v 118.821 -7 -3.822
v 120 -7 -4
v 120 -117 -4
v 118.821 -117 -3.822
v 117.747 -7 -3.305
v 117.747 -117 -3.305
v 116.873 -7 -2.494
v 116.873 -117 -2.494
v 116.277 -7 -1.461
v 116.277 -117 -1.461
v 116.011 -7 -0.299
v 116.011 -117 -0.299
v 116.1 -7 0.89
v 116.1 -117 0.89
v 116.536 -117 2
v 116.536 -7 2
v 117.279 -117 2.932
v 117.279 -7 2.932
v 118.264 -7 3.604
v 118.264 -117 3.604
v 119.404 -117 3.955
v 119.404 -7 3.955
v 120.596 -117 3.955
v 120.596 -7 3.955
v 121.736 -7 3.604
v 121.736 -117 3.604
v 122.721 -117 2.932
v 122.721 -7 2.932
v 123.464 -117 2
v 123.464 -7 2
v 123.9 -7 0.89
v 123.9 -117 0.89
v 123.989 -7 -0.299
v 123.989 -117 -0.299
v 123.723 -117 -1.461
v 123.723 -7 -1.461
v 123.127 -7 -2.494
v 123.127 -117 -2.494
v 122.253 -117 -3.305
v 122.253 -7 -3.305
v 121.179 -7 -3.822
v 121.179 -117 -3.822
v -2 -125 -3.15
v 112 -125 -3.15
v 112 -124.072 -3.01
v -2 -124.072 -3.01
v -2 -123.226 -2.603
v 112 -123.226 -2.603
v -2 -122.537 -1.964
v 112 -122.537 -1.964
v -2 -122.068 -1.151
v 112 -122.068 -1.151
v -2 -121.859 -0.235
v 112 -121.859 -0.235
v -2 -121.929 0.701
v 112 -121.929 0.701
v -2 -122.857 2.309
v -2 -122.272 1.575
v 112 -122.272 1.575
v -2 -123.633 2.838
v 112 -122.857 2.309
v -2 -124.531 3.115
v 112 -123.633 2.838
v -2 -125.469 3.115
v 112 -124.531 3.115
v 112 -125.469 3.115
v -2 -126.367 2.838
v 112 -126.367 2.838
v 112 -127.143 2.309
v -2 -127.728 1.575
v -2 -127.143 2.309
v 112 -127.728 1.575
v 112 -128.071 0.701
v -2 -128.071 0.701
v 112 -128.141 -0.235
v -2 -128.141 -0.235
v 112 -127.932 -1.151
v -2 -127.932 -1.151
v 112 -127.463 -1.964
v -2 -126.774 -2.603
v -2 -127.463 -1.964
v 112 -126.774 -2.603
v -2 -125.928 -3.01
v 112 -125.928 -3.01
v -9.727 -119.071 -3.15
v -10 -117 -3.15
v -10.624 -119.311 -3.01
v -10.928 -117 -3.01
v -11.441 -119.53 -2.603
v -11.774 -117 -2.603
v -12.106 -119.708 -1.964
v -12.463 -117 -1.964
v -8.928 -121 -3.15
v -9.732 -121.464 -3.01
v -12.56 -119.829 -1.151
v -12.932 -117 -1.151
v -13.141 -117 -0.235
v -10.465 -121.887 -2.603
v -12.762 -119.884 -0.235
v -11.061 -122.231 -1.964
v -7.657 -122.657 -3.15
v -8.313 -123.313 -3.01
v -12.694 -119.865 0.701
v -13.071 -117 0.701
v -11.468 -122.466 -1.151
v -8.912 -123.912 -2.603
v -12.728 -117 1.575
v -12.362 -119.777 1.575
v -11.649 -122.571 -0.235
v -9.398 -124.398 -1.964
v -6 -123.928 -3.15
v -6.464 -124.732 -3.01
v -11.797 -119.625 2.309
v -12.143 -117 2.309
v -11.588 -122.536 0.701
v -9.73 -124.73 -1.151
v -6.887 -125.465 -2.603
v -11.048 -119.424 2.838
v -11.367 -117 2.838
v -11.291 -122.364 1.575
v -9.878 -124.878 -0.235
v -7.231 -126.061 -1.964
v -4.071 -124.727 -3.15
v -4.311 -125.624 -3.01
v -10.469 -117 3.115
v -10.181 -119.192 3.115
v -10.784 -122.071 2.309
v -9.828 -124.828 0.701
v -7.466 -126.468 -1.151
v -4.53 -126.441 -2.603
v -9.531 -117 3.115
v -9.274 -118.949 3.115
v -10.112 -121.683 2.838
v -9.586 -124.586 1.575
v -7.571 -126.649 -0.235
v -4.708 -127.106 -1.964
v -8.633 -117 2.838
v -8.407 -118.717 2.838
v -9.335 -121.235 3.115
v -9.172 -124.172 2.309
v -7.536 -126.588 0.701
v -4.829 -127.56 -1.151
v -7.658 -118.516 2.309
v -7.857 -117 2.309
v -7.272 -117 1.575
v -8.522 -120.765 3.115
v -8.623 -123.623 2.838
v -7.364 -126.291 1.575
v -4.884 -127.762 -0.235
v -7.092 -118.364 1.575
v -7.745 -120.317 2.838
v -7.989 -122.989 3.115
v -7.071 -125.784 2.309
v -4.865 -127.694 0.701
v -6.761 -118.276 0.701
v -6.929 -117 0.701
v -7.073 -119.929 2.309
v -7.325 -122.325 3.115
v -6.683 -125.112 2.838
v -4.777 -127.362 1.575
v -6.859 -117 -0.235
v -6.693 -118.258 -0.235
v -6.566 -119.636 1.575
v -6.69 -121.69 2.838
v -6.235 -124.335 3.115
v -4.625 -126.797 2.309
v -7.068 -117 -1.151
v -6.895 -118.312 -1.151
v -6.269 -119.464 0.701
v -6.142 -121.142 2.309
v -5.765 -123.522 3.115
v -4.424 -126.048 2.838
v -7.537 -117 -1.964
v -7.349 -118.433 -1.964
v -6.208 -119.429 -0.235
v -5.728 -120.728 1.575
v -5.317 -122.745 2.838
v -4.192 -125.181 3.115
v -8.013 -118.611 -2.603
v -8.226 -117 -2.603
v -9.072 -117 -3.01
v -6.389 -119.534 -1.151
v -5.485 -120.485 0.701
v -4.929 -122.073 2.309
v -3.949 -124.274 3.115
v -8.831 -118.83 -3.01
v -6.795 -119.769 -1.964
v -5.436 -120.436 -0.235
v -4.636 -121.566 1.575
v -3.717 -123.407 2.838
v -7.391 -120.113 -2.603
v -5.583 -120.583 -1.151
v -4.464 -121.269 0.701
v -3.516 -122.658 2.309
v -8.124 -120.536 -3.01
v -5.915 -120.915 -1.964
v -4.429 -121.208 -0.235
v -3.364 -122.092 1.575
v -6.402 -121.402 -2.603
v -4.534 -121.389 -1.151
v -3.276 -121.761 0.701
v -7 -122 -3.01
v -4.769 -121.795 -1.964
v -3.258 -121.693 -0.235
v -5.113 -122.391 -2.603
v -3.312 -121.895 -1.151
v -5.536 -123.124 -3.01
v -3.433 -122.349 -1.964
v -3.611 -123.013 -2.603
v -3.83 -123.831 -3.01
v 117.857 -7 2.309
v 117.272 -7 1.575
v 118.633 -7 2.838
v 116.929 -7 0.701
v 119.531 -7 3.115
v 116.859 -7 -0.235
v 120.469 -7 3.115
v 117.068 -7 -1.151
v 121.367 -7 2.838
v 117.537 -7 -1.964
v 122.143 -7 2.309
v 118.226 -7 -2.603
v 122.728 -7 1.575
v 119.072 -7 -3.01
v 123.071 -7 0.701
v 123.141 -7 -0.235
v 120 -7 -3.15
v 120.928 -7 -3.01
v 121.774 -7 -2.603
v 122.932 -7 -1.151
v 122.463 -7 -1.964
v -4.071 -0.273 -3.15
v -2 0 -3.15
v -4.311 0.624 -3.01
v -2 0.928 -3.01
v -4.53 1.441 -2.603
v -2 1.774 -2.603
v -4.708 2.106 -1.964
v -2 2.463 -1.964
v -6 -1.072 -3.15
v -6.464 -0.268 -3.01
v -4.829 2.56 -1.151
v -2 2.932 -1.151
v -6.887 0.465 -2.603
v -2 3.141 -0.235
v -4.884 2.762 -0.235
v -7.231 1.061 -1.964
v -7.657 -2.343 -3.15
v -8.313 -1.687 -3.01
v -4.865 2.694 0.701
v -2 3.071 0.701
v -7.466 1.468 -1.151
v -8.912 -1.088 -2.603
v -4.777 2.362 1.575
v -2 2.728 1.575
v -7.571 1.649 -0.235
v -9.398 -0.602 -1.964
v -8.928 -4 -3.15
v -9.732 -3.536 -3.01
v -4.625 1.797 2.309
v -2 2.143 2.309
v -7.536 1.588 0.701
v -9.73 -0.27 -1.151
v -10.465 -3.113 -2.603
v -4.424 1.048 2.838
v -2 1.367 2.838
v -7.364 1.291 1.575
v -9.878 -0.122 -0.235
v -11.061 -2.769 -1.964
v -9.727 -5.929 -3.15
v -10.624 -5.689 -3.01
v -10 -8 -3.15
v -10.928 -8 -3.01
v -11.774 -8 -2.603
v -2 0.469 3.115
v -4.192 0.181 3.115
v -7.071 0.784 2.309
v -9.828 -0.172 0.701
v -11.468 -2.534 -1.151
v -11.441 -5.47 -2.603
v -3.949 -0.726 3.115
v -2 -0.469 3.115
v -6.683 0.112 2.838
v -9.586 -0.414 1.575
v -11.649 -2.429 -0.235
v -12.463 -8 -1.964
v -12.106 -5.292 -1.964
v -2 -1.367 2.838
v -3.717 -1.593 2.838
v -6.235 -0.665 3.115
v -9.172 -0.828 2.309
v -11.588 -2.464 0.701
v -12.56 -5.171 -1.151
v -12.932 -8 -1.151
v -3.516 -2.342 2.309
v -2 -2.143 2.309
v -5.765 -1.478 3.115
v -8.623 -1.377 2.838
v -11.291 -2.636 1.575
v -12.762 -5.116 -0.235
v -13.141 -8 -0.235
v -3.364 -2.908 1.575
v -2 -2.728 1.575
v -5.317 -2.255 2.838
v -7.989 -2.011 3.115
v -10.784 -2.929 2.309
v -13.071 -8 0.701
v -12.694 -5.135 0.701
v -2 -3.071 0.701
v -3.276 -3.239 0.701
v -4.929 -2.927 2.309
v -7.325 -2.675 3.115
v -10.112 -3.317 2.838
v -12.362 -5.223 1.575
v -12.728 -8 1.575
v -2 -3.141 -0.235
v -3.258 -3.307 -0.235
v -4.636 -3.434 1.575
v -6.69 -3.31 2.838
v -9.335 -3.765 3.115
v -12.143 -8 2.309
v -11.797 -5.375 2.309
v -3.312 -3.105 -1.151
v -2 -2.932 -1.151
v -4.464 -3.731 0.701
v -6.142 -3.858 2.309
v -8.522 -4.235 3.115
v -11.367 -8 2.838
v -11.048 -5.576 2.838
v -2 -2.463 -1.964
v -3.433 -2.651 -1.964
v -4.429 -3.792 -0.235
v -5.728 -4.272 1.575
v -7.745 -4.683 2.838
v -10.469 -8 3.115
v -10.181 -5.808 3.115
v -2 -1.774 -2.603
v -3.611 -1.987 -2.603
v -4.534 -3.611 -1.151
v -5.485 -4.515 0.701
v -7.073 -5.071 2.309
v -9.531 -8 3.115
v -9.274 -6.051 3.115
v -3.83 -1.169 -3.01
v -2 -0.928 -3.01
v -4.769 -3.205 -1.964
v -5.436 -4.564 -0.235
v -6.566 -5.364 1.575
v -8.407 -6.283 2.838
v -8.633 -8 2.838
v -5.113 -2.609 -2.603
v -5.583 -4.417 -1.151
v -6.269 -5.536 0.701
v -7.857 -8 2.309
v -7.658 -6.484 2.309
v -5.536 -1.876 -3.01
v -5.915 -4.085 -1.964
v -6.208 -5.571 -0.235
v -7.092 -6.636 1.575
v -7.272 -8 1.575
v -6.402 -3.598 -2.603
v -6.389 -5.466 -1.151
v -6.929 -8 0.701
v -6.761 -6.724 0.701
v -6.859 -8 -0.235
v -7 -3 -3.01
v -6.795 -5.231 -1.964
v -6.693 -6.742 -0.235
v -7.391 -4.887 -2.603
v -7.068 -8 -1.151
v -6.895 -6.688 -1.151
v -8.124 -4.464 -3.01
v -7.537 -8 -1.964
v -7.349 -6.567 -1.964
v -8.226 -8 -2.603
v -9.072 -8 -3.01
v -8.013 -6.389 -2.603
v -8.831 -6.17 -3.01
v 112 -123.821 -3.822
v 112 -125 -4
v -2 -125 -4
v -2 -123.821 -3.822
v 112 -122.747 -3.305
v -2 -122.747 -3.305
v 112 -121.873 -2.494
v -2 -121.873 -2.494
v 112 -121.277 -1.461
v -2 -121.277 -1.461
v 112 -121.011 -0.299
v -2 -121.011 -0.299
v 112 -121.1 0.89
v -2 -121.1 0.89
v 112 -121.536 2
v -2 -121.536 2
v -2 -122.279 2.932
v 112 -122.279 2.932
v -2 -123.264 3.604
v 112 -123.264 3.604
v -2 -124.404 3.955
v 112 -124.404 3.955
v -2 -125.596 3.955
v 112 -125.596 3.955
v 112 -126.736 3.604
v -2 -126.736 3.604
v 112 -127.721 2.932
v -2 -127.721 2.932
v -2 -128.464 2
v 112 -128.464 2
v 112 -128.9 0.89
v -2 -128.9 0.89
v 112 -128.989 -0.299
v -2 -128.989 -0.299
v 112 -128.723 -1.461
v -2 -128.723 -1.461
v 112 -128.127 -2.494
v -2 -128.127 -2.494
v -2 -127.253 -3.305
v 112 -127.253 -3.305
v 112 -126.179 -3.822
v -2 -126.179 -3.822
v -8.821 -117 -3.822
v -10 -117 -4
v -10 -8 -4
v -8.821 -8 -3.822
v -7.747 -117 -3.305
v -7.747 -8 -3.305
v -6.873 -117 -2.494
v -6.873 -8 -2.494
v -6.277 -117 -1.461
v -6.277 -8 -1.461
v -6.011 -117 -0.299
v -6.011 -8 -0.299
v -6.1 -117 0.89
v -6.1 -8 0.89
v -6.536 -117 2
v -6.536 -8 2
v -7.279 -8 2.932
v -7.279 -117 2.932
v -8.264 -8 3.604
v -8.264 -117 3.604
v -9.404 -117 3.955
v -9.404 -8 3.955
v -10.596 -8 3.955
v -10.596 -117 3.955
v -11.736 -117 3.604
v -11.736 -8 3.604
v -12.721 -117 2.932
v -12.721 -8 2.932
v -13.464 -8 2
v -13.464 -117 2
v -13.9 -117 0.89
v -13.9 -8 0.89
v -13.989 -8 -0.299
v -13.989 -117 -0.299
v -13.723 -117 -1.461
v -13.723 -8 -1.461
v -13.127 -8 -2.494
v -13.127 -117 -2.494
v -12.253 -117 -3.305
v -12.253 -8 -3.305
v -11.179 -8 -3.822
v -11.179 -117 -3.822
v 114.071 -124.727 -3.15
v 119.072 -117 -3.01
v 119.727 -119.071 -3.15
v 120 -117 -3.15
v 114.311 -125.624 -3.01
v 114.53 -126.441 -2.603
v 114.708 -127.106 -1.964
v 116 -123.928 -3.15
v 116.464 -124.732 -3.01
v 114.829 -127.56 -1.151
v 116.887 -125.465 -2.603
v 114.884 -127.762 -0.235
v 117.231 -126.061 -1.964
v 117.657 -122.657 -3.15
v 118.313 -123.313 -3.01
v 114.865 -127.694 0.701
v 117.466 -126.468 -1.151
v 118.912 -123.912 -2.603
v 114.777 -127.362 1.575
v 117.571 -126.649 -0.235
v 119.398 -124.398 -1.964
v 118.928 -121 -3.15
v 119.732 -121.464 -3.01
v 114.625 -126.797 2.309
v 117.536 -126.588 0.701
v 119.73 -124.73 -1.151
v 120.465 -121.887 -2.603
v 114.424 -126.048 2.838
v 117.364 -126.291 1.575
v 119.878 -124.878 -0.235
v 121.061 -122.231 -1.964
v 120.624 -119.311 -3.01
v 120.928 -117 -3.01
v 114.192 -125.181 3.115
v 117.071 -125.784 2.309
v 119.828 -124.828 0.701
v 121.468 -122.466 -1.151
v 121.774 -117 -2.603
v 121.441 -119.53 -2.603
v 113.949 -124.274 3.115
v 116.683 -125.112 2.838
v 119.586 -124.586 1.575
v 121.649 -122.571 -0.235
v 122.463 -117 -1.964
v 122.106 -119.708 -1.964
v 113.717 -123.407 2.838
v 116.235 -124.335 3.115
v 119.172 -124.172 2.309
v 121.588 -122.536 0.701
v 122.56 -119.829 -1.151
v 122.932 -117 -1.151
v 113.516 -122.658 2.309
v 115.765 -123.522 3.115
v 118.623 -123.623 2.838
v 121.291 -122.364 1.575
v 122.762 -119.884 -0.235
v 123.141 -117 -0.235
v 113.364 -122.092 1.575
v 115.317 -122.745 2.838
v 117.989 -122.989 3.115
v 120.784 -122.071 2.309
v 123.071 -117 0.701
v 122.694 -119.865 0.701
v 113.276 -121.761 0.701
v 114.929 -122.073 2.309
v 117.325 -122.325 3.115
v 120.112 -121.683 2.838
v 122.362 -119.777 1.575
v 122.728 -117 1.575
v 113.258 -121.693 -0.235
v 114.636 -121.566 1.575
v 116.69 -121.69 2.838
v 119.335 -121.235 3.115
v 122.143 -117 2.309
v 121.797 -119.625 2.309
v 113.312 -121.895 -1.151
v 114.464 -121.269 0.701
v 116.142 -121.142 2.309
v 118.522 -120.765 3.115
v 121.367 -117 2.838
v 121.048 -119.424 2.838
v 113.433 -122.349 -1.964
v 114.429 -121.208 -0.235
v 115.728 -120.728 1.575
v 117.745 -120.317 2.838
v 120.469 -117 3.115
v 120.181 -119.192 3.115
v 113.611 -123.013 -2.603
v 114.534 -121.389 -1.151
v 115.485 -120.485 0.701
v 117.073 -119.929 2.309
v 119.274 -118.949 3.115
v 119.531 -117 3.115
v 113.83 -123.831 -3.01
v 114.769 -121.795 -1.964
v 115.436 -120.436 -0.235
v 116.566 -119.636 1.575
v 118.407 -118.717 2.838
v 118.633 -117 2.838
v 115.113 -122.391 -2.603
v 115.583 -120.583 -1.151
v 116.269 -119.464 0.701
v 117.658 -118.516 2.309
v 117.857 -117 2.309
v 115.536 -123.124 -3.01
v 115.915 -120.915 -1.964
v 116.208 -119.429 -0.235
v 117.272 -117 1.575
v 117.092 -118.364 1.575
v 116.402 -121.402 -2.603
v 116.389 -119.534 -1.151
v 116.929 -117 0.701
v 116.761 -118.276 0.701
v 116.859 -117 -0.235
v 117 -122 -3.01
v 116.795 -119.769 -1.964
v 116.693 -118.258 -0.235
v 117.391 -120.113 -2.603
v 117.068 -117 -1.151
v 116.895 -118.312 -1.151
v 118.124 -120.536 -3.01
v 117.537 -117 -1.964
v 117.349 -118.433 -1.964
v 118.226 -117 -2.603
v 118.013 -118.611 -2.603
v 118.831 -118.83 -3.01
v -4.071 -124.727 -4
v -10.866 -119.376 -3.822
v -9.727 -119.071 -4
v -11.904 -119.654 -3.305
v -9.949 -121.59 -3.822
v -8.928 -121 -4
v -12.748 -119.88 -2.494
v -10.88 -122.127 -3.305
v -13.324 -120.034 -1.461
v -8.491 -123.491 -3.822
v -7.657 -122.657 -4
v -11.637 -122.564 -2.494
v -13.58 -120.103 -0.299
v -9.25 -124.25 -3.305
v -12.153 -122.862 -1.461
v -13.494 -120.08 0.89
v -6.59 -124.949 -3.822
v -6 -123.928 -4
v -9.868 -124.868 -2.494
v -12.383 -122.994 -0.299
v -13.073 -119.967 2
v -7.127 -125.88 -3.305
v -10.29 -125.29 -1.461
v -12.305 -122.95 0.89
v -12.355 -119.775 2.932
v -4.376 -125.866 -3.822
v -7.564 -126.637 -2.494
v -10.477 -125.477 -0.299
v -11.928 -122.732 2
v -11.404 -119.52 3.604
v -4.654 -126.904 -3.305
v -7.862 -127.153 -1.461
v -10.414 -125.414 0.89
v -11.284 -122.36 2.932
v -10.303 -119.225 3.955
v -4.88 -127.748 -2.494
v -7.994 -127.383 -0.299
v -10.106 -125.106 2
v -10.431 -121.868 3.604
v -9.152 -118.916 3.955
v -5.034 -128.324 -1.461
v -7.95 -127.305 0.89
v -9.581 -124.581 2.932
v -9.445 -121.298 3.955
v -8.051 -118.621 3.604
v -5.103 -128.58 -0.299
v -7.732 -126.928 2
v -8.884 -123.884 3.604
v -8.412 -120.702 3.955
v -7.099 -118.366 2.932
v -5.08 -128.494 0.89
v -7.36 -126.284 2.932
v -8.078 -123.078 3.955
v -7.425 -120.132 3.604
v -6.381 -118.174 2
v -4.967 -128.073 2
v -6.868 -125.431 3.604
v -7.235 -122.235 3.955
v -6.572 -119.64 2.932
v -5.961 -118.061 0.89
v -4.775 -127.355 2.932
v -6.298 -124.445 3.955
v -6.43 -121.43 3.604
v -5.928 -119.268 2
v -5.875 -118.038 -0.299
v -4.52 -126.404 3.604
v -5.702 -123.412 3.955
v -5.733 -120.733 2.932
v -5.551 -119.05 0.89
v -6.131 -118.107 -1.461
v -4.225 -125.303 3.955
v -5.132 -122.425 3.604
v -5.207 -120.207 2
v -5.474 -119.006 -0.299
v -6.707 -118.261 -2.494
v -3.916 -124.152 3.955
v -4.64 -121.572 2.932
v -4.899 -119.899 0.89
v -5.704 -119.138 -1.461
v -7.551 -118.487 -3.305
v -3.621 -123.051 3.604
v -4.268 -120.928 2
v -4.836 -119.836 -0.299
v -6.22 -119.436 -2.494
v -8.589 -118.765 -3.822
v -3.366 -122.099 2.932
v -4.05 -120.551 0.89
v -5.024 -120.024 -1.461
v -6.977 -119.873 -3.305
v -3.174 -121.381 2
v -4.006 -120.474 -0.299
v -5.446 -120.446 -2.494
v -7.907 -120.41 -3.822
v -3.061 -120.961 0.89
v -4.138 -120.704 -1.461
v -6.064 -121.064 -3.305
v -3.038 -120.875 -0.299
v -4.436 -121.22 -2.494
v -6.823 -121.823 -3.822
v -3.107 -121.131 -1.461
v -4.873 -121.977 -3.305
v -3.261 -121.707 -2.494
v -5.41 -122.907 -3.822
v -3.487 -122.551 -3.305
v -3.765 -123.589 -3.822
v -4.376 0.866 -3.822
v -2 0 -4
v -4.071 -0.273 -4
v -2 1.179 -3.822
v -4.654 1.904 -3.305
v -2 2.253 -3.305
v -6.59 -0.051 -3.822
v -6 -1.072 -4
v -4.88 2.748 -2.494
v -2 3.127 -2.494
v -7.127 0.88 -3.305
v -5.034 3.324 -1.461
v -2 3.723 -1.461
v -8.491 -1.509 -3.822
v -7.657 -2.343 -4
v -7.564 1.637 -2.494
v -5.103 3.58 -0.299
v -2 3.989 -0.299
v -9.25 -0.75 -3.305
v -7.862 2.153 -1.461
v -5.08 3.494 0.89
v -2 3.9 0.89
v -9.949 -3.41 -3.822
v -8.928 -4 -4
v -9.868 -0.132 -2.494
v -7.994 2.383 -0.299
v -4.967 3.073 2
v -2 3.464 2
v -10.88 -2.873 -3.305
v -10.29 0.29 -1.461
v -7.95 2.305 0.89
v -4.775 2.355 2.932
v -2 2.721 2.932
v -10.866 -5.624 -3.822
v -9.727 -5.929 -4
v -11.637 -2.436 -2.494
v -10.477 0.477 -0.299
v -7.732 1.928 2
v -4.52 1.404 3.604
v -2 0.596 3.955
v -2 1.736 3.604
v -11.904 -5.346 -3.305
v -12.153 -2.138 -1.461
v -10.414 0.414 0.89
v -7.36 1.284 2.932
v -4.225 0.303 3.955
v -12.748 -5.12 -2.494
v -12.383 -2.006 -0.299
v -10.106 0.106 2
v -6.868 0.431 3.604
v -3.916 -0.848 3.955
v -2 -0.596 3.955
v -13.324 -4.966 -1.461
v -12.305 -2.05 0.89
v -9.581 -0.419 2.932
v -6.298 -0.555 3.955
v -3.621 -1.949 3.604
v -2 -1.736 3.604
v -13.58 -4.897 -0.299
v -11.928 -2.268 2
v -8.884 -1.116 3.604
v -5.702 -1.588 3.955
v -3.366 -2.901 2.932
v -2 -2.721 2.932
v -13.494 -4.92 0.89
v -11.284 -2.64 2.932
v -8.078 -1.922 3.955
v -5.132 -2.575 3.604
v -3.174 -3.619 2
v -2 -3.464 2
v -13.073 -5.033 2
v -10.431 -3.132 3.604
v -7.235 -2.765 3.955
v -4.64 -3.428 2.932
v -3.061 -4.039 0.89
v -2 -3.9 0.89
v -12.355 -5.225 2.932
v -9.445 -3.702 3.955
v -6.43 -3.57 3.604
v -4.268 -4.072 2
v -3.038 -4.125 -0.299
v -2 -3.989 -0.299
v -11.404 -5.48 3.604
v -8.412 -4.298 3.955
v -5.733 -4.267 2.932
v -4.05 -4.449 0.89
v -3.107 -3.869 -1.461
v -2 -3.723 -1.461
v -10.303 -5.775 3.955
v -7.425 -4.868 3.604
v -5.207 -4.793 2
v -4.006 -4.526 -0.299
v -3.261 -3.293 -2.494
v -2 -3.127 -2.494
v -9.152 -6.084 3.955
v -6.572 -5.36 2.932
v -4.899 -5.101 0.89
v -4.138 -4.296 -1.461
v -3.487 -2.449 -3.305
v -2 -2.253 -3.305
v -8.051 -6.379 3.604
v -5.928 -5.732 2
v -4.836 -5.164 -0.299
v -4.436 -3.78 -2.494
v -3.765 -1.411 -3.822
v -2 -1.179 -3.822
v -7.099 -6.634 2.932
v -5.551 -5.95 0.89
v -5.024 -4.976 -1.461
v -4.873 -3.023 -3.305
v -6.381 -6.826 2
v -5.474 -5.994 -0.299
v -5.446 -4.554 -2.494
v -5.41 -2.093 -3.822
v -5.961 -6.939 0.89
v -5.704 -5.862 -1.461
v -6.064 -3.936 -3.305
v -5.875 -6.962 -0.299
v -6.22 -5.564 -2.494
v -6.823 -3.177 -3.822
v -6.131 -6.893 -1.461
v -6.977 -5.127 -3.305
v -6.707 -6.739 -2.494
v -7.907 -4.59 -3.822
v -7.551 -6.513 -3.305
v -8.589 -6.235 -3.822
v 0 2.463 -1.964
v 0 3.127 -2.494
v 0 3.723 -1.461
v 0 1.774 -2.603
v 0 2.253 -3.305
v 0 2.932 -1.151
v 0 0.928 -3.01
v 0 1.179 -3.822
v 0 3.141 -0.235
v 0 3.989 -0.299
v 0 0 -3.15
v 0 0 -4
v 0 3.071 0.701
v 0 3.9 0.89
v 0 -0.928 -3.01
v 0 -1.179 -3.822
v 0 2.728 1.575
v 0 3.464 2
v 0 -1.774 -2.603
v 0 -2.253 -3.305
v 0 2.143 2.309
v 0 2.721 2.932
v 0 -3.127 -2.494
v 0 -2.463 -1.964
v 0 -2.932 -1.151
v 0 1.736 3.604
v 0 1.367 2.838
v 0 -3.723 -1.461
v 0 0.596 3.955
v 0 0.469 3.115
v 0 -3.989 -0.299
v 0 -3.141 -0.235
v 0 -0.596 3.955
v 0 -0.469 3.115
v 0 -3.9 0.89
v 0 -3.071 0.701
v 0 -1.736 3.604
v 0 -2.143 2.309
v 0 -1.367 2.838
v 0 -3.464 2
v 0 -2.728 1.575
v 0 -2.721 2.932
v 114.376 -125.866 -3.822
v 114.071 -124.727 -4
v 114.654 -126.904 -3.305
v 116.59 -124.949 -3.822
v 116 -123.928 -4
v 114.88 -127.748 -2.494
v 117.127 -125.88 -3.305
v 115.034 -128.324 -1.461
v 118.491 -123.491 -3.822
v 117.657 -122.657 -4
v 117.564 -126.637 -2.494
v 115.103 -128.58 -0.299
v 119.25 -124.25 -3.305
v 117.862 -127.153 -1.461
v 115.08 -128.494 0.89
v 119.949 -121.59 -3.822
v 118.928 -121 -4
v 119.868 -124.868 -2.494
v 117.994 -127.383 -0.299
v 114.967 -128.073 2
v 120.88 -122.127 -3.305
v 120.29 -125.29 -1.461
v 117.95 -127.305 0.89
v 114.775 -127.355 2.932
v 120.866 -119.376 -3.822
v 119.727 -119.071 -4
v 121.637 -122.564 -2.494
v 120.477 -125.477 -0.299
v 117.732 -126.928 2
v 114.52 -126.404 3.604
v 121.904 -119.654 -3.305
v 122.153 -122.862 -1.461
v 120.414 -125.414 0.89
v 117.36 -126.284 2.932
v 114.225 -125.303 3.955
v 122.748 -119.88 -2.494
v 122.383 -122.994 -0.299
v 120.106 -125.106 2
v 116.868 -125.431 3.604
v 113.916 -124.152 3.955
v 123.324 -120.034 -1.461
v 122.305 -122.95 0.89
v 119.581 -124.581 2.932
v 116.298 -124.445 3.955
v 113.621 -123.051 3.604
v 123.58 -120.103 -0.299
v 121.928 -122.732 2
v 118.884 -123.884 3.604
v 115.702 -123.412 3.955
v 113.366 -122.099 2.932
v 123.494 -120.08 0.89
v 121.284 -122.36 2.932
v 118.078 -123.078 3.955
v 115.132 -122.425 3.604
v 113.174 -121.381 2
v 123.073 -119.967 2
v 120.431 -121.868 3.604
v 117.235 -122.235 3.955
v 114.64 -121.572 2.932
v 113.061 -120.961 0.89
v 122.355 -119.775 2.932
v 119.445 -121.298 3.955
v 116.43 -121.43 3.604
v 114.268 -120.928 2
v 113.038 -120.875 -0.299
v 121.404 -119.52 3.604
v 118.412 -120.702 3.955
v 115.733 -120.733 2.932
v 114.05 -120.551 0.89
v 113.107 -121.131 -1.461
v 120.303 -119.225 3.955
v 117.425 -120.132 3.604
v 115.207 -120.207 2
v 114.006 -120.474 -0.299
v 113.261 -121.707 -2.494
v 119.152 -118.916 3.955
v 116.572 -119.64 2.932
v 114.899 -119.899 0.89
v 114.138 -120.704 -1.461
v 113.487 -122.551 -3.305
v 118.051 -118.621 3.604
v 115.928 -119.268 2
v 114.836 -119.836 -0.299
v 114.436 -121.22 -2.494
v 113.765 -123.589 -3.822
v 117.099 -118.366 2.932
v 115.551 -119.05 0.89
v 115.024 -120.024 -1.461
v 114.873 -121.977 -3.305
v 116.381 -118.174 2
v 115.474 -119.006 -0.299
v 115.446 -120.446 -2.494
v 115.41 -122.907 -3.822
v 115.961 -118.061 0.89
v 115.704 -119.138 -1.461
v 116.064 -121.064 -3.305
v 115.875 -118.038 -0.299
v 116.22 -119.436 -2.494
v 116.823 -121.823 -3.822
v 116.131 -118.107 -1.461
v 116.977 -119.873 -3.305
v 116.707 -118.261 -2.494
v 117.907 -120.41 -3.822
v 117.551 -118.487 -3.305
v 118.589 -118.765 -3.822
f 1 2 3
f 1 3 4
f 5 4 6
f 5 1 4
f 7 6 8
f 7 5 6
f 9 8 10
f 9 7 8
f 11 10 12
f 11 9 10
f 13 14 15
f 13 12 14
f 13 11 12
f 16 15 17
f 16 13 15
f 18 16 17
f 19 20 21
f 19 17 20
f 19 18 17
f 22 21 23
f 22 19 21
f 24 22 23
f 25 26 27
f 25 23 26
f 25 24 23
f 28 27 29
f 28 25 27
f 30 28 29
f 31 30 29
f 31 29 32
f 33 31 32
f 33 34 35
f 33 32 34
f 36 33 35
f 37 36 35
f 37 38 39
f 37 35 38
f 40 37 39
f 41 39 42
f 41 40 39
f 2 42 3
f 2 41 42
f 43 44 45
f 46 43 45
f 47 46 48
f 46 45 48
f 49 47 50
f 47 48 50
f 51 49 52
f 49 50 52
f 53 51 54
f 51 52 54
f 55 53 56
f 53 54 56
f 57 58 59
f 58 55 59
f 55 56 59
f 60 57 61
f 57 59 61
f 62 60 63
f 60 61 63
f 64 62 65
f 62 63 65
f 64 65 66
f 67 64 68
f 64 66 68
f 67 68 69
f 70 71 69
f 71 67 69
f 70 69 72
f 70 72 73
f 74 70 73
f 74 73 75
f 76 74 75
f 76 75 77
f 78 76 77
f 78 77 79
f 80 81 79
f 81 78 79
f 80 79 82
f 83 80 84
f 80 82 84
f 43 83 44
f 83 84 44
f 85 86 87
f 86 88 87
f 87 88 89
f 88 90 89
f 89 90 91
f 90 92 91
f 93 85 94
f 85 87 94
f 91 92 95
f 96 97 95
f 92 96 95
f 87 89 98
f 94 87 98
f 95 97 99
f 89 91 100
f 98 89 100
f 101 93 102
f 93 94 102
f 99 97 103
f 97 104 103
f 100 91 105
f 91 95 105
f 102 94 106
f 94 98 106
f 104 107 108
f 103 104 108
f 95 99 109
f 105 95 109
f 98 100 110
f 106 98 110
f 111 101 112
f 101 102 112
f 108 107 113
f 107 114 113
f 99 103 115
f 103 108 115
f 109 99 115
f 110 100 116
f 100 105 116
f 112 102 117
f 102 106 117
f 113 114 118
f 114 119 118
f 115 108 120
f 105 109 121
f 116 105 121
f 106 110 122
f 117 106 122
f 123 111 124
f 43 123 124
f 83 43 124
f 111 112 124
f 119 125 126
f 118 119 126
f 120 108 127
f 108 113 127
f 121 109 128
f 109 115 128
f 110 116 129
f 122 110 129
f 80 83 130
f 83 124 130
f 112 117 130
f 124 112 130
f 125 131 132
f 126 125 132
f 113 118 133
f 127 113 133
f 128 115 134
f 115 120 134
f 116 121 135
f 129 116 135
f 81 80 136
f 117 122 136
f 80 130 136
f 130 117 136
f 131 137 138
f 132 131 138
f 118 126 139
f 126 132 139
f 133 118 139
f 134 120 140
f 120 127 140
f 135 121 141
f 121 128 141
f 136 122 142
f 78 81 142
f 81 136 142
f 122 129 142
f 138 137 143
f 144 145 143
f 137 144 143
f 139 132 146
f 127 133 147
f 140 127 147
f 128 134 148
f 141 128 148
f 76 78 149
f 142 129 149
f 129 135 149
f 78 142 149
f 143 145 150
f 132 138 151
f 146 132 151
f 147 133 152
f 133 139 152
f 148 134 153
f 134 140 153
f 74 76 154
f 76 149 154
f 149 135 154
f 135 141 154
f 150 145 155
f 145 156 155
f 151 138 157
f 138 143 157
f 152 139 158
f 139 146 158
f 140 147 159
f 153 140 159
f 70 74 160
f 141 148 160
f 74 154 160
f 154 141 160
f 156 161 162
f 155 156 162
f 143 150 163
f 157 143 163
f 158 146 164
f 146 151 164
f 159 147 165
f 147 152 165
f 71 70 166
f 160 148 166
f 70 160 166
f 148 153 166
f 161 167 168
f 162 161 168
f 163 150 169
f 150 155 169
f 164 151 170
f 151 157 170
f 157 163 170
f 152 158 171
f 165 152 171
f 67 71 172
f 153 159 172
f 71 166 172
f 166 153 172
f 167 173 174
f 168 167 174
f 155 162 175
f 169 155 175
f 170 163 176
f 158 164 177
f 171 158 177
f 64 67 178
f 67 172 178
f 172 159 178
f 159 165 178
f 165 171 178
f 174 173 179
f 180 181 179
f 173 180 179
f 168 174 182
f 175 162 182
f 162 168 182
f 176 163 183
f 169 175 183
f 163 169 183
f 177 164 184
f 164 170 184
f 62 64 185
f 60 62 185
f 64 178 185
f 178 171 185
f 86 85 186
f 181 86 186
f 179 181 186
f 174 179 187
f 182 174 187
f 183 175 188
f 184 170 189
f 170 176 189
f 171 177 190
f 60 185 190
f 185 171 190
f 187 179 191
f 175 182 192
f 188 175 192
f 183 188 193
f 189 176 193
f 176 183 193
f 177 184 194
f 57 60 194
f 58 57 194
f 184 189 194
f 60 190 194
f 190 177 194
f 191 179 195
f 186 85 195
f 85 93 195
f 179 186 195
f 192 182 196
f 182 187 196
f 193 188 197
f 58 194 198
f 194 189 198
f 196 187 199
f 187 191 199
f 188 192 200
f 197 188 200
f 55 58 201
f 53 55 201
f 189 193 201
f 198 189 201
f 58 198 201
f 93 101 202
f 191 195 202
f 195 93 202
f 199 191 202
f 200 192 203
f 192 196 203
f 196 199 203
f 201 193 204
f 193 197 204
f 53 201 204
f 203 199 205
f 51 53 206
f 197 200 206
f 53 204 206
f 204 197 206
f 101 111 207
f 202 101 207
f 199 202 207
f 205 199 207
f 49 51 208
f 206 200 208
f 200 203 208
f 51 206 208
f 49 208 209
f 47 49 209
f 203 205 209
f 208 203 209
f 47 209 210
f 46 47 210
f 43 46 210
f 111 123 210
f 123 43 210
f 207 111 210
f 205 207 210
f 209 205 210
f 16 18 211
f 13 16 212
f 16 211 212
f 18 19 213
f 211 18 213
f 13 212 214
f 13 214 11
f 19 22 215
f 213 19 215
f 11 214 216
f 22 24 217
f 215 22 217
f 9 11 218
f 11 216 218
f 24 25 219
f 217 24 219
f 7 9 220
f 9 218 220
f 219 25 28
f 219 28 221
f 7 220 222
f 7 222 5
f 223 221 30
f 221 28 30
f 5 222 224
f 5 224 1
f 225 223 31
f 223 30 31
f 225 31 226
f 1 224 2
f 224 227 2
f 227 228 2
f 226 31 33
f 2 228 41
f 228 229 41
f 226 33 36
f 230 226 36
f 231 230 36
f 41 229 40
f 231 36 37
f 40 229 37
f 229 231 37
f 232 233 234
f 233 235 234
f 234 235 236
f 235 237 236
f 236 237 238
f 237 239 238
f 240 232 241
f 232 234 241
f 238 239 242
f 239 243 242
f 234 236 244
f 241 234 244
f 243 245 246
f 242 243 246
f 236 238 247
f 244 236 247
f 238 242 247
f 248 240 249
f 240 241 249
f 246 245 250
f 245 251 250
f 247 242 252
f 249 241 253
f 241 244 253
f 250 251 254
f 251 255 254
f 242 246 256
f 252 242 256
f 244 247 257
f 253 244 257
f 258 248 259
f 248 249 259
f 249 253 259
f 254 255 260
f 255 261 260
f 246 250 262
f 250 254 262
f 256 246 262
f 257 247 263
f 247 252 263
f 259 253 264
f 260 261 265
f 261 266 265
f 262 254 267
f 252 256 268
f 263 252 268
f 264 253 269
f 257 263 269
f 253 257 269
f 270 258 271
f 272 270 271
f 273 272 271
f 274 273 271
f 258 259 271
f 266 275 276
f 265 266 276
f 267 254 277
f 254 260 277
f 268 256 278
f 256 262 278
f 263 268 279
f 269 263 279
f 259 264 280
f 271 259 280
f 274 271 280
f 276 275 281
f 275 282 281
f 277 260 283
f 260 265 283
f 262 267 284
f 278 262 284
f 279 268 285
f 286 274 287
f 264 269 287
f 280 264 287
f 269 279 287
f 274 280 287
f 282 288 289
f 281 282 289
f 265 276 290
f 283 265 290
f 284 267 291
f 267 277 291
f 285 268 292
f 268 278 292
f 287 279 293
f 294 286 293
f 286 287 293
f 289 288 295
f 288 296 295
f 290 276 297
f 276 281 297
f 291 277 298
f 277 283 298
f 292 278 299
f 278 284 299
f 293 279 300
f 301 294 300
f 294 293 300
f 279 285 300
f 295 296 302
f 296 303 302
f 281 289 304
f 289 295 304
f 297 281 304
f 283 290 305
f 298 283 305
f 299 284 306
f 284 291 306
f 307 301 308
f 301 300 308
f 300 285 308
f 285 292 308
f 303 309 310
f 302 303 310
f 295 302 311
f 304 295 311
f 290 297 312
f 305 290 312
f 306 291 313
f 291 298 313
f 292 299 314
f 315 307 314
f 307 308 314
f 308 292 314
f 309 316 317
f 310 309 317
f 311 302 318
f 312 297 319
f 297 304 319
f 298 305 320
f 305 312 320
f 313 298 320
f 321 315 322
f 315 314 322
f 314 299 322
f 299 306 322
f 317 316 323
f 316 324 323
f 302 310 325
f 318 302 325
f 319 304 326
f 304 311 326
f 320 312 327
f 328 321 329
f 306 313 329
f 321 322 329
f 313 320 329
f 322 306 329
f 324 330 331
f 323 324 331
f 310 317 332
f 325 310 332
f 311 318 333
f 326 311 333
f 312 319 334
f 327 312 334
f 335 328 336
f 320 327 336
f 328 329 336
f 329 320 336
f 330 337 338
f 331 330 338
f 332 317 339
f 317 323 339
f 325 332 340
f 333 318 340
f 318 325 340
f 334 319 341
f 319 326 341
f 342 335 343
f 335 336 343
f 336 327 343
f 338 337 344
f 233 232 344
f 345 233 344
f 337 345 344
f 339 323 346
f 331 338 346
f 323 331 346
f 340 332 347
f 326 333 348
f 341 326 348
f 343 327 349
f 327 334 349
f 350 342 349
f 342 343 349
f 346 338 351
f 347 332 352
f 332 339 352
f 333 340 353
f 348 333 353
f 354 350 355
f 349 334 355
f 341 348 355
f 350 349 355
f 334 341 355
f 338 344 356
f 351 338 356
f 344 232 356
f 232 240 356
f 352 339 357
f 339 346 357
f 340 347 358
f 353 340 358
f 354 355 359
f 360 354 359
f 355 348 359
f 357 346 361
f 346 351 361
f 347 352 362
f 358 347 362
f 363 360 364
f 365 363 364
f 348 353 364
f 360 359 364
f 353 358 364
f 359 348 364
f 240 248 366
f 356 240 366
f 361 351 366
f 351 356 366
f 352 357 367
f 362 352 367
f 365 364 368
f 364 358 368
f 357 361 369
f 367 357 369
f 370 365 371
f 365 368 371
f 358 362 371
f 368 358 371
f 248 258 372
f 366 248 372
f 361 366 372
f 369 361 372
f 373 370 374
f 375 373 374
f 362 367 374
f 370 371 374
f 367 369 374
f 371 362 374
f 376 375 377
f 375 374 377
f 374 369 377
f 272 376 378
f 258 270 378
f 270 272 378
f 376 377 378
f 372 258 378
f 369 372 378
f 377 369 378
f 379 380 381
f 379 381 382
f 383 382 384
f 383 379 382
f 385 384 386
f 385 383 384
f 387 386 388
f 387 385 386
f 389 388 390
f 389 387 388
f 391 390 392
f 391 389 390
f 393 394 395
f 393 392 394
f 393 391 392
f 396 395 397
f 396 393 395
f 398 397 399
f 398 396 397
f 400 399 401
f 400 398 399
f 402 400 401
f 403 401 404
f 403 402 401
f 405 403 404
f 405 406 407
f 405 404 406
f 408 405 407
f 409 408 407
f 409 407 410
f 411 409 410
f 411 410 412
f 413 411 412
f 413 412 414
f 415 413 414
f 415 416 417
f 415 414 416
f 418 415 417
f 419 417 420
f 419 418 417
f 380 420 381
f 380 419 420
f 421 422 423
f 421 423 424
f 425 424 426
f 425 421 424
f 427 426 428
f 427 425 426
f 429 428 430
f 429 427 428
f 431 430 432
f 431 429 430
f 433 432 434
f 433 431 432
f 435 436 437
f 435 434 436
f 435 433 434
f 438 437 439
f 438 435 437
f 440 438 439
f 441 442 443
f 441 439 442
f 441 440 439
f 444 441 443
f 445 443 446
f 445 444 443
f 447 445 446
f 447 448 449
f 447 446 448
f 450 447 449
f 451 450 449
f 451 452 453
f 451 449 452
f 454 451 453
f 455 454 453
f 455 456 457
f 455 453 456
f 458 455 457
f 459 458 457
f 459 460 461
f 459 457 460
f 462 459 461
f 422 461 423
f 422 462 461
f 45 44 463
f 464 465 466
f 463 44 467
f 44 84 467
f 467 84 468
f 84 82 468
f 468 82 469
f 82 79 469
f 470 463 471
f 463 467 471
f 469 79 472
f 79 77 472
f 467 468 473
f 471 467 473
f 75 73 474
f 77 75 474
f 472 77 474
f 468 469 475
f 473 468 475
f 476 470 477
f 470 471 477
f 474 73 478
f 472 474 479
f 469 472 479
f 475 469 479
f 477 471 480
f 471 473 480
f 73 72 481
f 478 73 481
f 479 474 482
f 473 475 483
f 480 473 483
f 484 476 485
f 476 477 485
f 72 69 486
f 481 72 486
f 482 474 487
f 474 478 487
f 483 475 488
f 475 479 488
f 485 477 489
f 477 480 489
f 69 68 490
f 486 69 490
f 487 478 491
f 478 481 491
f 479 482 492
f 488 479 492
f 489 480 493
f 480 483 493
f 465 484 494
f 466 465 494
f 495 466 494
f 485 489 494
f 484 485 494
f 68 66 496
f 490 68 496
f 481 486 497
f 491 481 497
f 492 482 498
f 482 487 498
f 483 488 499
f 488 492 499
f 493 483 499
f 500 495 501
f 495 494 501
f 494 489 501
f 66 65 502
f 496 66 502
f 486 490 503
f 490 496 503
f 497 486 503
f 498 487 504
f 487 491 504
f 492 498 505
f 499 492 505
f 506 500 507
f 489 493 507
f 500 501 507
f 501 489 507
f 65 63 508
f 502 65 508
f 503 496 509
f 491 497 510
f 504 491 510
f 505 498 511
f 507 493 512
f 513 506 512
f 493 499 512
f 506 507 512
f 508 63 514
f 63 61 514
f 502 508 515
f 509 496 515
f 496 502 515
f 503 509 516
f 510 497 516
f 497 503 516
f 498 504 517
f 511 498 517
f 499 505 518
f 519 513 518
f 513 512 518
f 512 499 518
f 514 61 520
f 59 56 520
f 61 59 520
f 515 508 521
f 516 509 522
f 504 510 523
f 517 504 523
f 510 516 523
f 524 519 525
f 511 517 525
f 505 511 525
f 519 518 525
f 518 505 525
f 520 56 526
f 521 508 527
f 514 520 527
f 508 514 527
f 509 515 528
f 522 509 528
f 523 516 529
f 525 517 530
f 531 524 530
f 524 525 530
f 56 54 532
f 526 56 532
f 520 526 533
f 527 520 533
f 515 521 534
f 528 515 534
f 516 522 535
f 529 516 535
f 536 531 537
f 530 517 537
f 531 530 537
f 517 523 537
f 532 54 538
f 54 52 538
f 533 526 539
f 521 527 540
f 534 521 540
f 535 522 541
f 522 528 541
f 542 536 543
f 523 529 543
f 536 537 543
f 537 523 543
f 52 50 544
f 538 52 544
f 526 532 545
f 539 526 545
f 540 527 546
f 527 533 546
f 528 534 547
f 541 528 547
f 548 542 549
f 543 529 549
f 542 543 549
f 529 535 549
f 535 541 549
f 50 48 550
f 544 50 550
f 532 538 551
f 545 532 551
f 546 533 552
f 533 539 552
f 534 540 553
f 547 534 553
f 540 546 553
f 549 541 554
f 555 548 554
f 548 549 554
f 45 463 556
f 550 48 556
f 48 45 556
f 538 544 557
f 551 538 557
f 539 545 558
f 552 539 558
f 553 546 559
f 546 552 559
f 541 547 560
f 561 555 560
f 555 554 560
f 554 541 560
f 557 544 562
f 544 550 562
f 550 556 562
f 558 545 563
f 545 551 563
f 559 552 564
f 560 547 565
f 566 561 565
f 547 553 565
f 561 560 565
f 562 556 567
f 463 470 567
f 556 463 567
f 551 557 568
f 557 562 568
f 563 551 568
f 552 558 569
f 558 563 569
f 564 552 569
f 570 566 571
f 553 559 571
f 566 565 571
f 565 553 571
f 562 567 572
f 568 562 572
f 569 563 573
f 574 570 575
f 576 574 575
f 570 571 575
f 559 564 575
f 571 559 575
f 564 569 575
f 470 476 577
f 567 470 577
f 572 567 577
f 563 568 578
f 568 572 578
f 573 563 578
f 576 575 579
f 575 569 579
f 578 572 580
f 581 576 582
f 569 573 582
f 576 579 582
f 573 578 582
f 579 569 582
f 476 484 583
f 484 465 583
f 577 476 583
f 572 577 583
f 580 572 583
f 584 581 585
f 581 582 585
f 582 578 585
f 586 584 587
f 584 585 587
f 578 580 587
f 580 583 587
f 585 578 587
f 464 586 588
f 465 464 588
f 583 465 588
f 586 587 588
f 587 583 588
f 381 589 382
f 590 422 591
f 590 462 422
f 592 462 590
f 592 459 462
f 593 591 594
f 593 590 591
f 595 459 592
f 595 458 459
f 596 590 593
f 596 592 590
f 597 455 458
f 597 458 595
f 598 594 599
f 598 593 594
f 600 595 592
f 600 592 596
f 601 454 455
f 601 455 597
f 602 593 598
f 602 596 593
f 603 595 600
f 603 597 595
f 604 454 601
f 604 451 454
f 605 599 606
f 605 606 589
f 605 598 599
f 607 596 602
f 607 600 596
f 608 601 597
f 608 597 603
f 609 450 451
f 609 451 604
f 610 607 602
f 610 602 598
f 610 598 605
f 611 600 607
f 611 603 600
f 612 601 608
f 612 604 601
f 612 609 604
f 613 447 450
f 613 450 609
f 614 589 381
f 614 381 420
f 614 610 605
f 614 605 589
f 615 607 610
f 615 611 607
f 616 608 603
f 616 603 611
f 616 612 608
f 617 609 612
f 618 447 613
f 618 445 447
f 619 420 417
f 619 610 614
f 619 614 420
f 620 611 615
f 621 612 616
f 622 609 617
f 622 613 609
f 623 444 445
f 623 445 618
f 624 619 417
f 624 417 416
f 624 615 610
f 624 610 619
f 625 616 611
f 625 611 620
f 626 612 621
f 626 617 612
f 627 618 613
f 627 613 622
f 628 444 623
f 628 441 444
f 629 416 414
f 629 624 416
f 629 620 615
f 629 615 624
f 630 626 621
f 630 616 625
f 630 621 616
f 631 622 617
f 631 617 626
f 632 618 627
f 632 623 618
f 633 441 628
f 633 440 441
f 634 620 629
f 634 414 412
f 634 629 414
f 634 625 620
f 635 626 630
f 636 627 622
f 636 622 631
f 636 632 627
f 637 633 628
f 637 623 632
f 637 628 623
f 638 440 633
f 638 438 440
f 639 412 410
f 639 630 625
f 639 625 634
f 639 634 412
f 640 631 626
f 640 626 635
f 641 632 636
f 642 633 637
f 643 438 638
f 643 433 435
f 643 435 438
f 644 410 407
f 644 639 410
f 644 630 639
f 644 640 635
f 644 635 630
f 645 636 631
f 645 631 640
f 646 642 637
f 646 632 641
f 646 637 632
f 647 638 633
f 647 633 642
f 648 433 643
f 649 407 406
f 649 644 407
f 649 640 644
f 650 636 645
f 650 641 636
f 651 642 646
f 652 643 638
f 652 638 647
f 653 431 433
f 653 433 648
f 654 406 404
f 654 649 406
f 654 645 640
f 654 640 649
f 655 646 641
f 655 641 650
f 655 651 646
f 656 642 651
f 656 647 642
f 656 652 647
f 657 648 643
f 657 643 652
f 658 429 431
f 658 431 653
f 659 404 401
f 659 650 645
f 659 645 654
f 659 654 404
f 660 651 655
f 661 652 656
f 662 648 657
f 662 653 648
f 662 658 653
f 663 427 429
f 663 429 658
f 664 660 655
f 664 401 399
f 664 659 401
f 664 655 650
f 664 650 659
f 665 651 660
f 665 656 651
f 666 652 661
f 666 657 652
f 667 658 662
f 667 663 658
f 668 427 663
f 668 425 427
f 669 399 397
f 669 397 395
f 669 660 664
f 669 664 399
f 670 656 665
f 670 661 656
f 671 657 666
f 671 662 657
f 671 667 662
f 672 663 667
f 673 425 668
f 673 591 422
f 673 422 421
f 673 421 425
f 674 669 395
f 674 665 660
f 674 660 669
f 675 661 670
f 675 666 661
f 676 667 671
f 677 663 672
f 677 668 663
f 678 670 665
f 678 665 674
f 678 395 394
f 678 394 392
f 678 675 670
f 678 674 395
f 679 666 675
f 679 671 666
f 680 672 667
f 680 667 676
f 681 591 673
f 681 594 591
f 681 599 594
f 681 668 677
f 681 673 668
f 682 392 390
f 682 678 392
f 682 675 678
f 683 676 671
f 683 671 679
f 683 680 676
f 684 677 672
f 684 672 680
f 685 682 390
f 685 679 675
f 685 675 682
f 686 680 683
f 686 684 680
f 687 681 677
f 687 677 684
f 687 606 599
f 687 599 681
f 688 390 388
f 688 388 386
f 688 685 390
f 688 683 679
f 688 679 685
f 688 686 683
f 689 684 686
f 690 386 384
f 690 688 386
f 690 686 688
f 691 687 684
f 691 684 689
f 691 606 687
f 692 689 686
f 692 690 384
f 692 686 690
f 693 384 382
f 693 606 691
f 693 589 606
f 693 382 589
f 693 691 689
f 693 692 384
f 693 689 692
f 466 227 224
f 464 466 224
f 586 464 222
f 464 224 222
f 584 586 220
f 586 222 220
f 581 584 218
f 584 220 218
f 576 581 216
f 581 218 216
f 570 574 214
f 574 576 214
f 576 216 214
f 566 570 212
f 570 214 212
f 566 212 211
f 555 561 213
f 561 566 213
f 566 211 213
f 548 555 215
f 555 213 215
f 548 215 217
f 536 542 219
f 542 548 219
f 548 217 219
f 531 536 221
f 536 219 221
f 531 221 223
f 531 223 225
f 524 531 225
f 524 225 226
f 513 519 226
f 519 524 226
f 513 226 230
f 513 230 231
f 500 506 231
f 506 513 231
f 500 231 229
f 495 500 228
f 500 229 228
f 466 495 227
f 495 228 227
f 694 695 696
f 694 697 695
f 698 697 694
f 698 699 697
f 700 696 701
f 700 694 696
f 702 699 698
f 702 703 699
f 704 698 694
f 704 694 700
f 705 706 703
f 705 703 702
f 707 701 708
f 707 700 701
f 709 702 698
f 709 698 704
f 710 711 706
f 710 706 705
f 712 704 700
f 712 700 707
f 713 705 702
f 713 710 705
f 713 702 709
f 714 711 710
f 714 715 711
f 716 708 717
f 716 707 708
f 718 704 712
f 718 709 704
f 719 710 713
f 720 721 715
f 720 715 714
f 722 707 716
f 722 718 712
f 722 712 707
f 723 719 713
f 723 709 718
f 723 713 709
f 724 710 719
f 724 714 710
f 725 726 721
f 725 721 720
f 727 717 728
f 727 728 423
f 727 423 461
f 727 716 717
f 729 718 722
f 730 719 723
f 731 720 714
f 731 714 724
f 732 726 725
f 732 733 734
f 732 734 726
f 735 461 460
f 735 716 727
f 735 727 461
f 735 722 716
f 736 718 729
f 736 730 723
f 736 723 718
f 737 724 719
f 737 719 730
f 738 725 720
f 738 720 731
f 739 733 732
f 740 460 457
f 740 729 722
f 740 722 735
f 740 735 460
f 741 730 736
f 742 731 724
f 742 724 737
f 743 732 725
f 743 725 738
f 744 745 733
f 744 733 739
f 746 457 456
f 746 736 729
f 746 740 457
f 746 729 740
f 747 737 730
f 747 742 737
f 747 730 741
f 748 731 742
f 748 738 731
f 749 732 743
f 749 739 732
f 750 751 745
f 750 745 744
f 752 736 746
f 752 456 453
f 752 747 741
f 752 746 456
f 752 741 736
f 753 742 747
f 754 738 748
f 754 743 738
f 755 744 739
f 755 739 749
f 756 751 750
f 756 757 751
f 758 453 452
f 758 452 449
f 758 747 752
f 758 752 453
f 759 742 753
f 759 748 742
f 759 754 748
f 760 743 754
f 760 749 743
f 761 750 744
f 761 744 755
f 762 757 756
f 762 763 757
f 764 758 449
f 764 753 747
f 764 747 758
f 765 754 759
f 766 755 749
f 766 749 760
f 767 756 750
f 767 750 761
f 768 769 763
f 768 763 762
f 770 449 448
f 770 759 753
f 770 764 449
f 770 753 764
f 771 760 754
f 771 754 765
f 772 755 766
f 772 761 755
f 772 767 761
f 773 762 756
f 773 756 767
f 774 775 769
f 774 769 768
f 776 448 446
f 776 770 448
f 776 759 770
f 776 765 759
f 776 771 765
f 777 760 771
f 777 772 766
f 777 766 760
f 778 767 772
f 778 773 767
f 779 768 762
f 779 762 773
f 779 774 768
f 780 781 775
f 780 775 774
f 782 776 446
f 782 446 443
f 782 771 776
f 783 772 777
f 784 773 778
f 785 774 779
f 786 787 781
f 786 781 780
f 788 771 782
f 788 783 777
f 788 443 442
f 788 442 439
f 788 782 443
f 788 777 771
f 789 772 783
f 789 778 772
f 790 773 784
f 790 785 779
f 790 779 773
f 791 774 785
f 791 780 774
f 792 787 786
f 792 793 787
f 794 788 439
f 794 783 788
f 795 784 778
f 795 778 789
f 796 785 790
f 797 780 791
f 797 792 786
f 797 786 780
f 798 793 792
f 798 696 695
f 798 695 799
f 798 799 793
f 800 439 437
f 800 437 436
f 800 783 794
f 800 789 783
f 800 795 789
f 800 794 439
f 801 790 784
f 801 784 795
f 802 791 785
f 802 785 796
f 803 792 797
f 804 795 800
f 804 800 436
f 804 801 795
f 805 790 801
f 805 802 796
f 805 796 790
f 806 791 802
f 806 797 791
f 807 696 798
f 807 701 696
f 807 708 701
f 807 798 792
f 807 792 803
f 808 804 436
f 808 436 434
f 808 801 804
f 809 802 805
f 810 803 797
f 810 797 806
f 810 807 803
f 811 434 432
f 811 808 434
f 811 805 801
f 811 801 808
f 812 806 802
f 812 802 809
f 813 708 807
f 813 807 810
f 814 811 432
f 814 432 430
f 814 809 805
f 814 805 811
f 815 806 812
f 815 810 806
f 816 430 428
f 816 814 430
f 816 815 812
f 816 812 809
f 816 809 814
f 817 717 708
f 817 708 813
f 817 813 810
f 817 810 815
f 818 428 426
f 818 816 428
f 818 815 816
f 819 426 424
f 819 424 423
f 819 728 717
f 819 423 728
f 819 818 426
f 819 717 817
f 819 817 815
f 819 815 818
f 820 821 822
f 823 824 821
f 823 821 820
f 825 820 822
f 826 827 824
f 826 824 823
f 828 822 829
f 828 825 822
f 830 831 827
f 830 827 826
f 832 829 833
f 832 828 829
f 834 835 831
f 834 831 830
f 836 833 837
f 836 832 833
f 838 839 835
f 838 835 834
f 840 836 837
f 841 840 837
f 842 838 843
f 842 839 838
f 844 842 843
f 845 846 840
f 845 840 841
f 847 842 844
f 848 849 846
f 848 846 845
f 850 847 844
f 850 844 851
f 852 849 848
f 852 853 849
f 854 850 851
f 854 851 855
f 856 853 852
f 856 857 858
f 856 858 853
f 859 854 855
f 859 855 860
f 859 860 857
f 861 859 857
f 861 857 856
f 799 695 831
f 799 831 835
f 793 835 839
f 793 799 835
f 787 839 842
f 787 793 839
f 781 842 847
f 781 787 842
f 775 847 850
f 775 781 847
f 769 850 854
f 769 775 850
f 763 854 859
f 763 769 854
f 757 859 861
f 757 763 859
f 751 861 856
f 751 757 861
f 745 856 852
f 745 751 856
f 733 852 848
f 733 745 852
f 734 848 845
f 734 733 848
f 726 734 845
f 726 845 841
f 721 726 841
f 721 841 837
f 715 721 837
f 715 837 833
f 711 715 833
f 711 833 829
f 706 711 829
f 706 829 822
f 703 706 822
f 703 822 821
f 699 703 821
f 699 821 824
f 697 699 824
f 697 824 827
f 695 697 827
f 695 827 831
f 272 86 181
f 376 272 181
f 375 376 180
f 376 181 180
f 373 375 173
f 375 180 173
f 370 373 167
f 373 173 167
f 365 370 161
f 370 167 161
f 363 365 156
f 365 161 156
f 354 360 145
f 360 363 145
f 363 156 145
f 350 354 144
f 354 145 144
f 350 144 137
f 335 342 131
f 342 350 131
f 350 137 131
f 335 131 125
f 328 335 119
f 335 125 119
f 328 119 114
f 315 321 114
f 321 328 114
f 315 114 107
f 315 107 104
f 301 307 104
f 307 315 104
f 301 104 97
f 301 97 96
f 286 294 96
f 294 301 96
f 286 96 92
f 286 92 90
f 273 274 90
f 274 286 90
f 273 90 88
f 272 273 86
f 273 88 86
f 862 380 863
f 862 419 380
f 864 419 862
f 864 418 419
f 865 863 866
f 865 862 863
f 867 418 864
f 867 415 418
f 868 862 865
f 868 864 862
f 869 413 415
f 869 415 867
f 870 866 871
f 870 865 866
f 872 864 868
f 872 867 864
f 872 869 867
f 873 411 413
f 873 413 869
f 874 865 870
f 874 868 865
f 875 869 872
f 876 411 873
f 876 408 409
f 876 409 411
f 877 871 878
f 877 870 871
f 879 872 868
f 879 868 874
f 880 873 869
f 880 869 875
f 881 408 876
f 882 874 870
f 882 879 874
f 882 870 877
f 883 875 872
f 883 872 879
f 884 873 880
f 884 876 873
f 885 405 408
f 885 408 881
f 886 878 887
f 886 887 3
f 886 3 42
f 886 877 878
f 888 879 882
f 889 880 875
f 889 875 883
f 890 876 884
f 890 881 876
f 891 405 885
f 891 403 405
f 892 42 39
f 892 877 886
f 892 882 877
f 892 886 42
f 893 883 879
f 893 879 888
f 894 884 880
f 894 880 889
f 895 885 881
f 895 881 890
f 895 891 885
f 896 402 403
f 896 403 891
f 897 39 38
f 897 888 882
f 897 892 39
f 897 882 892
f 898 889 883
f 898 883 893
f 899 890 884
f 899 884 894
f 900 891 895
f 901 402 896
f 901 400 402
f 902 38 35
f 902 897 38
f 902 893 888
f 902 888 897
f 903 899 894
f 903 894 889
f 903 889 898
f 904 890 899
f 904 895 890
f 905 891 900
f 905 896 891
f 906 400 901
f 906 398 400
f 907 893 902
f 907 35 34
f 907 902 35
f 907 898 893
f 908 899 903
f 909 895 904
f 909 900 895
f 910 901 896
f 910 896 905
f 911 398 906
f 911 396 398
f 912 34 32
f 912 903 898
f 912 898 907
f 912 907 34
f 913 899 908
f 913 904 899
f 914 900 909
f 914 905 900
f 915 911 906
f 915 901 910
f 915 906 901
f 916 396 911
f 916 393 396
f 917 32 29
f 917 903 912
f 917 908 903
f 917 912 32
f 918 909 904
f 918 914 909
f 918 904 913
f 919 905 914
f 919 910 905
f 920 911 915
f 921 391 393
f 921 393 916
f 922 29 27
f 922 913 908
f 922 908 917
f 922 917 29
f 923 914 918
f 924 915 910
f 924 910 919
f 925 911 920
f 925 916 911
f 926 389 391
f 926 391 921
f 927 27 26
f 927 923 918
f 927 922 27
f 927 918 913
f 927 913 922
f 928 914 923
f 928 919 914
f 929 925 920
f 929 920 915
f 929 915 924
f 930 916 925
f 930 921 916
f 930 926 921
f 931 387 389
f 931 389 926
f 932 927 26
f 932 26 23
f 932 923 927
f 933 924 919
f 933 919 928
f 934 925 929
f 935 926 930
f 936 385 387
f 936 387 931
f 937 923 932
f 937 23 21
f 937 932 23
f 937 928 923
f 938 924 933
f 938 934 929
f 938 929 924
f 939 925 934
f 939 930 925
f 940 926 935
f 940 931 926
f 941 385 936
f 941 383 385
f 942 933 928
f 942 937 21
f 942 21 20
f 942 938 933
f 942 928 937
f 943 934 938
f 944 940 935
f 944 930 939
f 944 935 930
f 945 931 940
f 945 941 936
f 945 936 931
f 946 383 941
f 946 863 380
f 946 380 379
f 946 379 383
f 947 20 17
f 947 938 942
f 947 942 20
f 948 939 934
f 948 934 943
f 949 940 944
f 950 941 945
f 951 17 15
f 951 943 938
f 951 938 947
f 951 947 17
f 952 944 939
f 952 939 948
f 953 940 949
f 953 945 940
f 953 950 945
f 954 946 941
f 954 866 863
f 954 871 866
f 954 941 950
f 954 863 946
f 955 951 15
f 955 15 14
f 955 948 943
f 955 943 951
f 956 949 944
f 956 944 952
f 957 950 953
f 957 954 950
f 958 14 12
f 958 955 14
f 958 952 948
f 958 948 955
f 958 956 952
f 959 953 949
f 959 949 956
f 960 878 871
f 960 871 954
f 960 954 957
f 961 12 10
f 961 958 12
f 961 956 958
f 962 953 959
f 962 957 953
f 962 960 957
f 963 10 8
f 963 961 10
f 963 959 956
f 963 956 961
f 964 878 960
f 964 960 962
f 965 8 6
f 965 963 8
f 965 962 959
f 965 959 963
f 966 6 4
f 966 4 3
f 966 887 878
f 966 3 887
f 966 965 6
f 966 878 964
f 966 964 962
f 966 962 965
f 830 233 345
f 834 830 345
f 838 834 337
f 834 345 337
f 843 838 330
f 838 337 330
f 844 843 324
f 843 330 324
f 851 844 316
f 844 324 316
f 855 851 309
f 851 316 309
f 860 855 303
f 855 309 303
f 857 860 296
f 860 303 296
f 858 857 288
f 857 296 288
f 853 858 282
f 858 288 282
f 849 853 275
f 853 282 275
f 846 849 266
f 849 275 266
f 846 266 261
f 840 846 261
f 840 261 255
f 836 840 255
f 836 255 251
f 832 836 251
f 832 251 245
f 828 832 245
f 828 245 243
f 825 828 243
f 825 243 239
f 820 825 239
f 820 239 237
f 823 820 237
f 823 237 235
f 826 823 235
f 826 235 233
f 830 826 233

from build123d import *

# Parameters (mm, degrees)
SKETCH2_R   = 4
SKETCH2_R_2 = 3.15


with BuildPart() as part:
    # Sweep1: sweep along a path in Sketch1
    with BuildLine(Plane.XY) as sweep1_path:
        Line((0, 0), (-2, 0))
        ThreePointArc((-2, 0), (-7.656854249, -2.343145751), (-10, -8))
        Line((-10, -8), (-10, -117))
        ThreePointArc((-10, -117), (-7.656854249, -122.656854249), (-2, -125))
        Line((-2, -125), (112, -125))
        ThreePointArc((112, -125), (117.656854249, -122.656854249), (120, -117))
        Line((120, -117), (120, -7))
    # Sketch2 → Sweep1 (sweep)
    with BuildSketch(Plane(origin=(0, 0, 0), x_dir=(0, 0, -1), z_dir=(1, 0, 0))):
        Circle(SKETCH2_R)
        Circle(SKETCH2_R_2, mode=Mode.SUBTRACT)
    sweep(path=sweep1_path.line)


solid = part.part
